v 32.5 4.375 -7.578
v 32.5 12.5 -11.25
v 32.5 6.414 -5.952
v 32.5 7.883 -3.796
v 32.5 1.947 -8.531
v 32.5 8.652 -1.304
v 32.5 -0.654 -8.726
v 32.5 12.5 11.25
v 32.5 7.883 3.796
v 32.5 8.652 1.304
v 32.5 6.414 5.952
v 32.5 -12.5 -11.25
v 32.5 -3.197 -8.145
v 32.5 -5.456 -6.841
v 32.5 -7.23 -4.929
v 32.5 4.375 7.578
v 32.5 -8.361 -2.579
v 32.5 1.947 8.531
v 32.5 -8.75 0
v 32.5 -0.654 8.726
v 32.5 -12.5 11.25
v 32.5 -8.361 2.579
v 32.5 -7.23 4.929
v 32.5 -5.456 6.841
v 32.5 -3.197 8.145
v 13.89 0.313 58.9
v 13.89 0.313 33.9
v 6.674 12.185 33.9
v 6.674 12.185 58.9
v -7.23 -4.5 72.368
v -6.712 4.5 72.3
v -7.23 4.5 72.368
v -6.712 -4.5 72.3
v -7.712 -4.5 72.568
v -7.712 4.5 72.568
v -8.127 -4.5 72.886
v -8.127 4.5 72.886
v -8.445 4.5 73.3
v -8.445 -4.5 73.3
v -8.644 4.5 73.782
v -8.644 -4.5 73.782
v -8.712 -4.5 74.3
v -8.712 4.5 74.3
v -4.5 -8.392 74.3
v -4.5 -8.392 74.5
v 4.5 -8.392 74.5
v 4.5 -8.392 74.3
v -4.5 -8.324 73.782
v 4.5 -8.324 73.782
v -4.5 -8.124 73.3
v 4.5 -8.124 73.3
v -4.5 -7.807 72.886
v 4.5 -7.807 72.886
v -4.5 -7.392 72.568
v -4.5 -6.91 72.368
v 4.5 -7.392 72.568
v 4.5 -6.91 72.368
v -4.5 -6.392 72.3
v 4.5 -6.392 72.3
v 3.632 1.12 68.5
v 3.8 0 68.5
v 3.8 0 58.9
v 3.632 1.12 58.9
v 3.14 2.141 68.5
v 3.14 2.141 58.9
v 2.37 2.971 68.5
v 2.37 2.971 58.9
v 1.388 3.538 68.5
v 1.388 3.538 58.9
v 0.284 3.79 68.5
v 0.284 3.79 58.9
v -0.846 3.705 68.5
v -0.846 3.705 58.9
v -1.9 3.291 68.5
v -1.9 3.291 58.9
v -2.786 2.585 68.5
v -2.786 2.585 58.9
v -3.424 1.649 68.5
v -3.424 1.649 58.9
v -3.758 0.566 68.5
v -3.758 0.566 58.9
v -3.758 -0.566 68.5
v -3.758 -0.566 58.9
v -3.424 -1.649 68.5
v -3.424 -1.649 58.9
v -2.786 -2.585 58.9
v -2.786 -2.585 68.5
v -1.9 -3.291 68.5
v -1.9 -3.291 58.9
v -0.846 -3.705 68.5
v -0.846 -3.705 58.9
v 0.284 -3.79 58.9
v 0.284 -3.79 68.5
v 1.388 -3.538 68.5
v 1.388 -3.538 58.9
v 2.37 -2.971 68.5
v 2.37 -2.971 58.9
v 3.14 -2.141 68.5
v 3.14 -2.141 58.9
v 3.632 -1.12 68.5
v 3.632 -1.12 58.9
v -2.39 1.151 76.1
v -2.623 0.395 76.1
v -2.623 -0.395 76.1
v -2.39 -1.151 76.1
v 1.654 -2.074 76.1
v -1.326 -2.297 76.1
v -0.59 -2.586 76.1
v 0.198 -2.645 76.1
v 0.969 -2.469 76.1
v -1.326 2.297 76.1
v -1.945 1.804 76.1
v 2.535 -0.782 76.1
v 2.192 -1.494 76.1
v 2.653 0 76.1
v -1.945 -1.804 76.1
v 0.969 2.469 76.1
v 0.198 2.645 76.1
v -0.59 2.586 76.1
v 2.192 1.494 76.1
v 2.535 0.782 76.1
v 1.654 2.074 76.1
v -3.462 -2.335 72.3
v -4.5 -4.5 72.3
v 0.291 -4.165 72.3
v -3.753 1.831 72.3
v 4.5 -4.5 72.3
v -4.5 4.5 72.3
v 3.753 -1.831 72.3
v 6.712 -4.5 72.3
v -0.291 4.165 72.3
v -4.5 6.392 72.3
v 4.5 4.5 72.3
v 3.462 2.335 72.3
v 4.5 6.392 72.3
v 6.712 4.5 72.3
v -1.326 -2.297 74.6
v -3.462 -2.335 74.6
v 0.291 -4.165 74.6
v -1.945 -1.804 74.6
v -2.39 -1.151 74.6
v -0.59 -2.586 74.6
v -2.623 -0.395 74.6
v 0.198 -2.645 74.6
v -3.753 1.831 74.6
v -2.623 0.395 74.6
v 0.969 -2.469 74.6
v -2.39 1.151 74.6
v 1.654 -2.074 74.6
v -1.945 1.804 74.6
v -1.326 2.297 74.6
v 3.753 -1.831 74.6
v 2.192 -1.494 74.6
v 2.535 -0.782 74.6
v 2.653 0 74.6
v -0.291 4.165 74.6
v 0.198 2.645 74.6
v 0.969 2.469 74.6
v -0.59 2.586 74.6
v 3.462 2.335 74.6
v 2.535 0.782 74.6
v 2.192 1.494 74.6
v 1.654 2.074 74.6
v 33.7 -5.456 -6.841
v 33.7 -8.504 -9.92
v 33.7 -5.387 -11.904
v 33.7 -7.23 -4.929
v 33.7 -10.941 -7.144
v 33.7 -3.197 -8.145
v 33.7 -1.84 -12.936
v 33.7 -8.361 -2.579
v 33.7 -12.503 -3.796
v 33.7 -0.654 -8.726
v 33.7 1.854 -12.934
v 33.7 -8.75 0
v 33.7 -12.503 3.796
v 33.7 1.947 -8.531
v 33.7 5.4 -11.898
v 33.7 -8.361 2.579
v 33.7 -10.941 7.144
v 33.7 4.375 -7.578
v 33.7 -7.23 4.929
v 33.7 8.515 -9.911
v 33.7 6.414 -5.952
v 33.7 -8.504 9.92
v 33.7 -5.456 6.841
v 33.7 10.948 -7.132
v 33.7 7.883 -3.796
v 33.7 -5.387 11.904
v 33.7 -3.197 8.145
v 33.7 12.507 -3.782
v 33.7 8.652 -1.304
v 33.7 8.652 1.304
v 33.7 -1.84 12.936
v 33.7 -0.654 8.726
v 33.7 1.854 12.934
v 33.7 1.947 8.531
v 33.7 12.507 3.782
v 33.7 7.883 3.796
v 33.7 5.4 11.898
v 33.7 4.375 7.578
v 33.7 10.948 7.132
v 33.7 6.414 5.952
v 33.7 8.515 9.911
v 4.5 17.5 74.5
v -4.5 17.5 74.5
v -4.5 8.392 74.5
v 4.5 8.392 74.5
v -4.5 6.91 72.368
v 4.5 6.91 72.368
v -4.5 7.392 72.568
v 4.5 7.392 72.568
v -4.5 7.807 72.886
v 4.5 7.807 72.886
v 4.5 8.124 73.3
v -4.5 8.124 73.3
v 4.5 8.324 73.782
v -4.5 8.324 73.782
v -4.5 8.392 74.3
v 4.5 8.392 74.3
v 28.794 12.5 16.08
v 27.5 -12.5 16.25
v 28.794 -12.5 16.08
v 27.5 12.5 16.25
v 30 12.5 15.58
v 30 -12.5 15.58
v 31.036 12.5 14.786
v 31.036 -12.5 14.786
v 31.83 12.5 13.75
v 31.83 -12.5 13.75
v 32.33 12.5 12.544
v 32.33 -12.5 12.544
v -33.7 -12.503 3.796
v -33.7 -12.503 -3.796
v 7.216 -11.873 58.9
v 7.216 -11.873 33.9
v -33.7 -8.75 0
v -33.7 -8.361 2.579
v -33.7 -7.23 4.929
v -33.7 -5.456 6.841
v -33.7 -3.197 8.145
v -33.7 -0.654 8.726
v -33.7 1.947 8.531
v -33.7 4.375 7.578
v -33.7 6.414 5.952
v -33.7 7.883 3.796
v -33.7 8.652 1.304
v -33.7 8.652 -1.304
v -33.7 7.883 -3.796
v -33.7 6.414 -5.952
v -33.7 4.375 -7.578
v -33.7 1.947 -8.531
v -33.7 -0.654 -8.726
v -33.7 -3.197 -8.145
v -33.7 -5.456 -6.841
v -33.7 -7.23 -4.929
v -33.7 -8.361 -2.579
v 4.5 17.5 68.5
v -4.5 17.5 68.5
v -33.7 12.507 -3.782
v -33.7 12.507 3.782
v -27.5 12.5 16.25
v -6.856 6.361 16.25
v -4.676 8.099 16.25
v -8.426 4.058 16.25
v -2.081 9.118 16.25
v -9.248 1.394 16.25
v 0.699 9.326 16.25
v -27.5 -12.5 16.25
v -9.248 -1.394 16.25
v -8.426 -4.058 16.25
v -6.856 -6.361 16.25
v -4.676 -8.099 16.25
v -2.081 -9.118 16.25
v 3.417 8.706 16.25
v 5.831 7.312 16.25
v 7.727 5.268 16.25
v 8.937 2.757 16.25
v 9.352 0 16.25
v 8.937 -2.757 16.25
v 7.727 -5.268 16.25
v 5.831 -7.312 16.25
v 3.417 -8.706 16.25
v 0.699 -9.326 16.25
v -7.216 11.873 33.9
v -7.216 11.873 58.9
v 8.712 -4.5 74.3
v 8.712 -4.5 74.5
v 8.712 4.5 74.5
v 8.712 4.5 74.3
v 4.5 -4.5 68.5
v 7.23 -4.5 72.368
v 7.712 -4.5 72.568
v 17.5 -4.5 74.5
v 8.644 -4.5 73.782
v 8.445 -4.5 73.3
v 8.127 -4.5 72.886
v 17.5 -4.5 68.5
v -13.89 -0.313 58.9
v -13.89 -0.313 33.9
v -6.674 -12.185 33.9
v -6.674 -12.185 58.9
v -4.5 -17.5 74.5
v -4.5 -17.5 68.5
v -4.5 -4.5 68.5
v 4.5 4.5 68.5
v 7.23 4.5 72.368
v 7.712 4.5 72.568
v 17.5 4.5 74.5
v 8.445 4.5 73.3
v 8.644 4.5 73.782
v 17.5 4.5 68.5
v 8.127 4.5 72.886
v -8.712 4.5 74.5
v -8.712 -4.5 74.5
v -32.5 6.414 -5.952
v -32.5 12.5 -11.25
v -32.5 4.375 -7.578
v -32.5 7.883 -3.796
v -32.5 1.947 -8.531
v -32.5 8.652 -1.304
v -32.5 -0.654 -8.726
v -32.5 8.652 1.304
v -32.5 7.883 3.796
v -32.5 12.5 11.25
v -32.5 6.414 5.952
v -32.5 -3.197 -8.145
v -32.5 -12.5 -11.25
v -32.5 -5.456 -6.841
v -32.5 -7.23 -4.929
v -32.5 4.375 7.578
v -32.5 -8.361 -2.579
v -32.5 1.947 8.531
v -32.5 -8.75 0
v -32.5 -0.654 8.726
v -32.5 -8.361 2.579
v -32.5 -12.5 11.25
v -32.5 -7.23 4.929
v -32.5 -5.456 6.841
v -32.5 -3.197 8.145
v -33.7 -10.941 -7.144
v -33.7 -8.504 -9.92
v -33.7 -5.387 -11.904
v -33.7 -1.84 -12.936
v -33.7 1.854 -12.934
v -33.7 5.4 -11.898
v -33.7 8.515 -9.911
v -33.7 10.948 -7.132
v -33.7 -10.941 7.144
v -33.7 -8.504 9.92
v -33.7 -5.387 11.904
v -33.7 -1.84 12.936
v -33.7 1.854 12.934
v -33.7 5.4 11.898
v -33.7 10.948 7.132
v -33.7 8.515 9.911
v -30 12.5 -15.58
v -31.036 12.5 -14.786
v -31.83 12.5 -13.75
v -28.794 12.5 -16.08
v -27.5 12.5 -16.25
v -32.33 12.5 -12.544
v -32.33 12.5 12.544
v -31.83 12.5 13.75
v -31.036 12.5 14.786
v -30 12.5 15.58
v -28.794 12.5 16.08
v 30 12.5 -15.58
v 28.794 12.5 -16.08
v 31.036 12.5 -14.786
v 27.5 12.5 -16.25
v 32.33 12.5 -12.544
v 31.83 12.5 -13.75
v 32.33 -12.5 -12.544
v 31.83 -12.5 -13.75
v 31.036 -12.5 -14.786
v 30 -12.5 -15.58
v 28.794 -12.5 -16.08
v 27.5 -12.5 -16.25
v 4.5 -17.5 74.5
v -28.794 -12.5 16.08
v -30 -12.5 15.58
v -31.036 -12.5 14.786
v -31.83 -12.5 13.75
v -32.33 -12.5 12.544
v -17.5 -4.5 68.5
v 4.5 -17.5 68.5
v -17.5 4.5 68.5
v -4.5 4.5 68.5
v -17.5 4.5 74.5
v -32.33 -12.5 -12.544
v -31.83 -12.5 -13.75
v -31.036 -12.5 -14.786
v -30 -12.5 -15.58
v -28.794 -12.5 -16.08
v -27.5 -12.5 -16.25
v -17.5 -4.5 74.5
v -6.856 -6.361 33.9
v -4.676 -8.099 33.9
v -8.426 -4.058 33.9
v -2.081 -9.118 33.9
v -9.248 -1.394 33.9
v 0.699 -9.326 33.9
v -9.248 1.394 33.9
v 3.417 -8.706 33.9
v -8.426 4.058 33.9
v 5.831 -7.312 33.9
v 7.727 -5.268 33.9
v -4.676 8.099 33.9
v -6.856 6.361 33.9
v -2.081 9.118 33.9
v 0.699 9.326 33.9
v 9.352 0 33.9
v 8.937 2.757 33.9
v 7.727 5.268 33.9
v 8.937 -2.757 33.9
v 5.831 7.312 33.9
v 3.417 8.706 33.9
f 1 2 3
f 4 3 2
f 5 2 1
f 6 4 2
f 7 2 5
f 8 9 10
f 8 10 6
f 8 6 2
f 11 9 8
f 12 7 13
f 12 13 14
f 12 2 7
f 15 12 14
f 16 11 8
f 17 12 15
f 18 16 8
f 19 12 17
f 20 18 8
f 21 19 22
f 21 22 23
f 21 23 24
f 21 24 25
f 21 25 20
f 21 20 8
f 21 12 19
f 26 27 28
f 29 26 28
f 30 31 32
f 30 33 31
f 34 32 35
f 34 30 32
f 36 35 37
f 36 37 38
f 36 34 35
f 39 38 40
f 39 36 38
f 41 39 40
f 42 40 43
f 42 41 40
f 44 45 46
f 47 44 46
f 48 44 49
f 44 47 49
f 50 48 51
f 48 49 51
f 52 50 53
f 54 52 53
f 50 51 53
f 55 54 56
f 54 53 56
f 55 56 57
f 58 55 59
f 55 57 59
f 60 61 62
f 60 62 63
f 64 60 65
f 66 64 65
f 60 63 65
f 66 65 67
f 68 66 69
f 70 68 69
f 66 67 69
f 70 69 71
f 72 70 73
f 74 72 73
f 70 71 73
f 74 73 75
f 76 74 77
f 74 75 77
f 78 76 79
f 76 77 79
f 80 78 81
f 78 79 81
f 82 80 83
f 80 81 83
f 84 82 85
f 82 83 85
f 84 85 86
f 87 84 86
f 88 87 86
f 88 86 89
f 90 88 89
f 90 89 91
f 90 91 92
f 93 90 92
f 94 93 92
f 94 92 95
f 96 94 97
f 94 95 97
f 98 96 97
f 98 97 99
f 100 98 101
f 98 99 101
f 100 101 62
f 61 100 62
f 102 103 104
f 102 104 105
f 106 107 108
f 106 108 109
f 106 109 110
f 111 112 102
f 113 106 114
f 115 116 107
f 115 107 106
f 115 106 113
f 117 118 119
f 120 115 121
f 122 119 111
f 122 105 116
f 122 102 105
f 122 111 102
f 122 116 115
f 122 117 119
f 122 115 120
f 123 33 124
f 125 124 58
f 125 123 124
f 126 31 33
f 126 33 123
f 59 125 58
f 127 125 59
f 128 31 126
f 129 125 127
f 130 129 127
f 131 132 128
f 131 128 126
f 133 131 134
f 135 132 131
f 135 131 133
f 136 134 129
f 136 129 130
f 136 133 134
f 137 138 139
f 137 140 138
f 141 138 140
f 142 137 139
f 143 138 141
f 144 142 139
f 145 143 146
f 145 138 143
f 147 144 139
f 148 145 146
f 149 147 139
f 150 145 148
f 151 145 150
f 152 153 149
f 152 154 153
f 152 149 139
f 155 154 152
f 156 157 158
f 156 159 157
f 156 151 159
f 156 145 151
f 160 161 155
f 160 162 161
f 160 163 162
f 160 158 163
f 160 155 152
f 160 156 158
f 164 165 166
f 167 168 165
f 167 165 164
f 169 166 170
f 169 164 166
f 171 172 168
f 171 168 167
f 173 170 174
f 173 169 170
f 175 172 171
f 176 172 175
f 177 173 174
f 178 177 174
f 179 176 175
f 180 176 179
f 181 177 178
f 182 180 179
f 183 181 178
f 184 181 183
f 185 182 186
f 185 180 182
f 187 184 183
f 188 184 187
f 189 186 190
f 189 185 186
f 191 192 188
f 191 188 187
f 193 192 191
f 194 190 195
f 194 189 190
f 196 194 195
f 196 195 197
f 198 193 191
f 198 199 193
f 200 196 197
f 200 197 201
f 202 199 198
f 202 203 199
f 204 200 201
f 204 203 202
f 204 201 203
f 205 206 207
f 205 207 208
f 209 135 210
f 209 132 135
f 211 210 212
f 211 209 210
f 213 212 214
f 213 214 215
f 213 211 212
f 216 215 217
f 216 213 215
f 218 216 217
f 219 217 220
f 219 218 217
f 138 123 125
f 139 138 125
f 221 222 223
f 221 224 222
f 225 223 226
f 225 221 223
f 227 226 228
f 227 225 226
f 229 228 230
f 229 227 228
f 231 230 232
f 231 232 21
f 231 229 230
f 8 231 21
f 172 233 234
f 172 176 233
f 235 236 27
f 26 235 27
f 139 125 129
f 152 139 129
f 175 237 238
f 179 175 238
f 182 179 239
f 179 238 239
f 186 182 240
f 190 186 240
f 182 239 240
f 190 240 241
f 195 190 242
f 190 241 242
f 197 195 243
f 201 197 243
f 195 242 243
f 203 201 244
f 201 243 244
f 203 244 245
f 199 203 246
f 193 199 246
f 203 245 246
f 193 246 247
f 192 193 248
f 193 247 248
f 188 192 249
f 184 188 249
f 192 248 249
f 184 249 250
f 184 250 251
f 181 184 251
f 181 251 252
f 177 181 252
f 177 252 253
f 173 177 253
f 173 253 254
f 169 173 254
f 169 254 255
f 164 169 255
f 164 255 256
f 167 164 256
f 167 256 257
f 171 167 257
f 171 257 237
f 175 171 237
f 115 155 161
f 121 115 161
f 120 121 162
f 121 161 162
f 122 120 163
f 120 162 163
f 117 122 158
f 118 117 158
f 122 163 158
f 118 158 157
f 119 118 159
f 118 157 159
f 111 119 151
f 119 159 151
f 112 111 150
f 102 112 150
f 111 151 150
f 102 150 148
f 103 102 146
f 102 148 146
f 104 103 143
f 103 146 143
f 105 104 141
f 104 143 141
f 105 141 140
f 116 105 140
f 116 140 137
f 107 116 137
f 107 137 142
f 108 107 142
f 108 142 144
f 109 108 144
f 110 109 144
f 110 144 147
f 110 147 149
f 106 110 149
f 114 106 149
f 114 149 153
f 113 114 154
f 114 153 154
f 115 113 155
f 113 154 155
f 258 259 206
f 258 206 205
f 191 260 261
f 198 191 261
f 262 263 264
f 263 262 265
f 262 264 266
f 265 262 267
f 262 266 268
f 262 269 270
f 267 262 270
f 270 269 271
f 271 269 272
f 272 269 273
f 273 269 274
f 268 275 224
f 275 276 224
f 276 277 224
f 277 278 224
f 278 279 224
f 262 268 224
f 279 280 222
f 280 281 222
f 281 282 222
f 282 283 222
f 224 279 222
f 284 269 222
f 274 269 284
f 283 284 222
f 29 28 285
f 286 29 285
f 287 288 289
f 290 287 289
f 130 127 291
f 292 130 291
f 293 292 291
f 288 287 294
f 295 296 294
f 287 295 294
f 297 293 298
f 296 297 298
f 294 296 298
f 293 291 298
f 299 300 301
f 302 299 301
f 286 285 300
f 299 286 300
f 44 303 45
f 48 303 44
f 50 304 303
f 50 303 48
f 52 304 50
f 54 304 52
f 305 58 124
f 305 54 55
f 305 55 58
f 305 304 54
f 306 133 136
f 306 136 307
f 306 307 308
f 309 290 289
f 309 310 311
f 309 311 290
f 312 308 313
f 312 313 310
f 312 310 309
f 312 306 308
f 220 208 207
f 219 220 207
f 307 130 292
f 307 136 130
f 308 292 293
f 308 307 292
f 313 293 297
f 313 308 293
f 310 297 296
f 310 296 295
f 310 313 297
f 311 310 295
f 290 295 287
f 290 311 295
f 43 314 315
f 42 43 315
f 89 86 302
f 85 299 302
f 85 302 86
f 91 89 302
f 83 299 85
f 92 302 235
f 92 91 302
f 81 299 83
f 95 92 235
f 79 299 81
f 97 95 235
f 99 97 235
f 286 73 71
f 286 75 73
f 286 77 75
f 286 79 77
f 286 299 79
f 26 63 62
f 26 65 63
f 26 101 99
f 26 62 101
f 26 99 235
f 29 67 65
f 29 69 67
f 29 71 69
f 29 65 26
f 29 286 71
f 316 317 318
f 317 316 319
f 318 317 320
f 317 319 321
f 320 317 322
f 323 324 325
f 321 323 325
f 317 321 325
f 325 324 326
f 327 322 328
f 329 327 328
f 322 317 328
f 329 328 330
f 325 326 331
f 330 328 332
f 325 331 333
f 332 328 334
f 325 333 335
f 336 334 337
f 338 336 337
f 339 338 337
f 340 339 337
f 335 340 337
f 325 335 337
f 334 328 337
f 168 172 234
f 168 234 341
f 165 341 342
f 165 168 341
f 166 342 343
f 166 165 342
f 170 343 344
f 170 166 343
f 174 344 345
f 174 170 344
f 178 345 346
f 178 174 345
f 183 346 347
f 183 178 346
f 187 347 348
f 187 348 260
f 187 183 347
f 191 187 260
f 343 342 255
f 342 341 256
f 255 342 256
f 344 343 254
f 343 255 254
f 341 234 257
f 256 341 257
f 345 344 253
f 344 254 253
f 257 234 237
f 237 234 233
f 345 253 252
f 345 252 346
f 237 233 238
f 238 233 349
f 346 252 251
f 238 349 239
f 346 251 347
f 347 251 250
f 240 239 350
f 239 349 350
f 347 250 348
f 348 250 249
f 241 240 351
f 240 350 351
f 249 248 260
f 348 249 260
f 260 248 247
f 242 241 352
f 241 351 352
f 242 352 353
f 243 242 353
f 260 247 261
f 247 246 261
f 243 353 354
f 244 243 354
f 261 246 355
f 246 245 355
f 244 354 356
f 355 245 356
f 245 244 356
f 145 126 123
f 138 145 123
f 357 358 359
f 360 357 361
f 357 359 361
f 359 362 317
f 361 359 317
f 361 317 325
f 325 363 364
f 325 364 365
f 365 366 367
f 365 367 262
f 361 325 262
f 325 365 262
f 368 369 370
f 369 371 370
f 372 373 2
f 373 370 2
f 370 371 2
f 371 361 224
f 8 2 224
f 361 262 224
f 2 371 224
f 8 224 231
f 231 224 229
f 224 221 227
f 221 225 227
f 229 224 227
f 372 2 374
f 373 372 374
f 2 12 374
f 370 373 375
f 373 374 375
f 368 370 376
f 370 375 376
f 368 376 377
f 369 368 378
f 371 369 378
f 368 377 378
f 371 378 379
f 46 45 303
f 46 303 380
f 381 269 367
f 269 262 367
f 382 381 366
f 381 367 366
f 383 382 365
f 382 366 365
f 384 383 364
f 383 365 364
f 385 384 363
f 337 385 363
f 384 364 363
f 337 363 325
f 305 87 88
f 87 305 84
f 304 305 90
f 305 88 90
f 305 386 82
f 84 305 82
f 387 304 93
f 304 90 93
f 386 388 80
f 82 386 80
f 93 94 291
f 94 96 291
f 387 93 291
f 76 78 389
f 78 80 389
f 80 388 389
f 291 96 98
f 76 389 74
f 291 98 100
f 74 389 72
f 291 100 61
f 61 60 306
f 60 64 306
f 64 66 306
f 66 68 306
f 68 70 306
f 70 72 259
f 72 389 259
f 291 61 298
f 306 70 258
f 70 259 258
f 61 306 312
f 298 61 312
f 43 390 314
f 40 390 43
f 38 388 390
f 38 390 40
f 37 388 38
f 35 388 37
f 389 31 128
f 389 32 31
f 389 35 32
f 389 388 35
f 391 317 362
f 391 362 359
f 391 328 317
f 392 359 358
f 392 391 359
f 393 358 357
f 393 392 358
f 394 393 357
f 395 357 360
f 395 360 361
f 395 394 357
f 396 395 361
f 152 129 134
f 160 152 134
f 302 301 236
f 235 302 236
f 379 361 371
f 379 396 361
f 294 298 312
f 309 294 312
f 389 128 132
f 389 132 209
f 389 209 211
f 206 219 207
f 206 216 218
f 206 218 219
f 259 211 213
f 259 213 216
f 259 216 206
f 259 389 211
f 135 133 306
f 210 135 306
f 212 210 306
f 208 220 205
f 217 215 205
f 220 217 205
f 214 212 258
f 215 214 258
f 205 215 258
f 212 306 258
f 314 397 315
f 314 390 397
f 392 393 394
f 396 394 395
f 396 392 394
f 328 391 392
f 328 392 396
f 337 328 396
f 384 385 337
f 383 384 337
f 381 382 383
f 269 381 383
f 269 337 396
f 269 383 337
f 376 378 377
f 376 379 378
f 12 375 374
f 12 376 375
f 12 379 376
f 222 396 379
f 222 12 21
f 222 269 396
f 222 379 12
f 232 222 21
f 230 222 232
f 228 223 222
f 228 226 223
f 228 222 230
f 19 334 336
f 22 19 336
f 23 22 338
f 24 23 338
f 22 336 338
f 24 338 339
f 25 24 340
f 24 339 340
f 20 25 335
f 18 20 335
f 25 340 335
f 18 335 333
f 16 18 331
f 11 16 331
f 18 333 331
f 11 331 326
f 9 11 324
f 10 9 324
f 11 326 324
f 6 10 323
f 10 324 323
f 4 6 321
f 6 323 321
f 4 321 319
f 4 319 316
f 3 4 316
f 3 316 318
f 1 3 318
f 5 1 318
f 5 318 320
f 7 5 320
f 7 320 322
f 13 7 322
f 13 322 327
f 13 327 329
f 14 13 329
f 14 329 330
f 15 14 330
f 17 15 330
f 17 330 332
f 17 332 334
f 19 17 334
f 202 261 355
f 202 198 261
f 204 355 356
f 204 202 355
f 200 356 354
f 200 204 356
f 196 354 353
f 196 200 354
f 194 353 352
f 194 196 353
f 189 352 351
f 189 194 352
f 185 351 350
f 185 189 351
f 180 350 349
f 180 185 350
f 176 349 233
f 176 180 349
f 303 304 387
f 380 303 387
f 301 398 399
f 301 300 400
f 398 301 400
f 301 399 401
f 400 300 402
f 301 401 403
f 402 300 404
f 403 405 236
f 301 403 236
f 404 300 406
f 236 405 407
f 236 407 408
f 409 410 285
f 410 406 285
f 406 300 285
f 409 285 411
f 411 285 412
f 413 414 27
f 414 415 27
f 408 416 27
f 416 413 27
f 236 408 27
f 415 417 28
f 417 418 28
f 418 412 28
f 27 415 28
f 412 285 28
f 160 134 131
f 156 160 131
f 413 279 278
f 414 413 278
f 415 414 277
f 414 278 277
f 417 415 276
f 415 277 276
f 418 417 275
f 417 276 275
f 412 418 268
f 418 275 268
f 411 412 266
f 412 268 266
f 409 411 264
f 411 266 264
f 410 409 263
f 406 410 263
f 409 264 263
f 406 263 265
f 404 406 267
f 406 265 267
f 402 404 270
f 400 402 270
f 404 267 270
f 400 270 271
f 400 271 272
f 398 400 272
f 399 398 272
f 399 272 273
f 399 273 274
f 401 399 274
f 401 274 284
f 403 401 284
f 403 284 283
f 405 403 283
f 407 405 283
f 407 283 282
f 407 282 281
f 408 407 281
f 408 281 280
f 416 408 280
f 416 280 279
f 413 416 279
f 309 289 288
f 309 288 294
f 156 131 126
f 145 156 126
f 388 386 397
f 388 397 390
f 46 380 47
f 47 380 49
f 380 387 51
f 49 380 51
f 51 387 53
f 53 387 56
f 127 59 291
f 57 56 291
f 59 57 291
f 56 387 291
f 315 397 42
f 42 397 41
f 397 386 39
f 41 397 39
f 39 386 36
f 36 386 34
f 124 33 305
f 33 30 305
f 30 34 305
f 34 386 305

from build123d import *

# Parameters (mm, degrees)
F0_W      = 65
F0_H      = 32.5
F1_DEPTH  = 12.5
F2_R      = 9.3523138159
F3_DEPTH  = 33.9
F4_R      = 5
F6_DEPTH  = 25
F7_R      = 3.8004519978
F8_DEPTH  = 9.6
F10_W     = 35
F10_H     = 9
F10_R     = 3.8004519978
F11_DEPTH = 6
F9_W      = 9
F9_H      = 35
F9_R      = 3.8004519978
F12_DEPTH = 6
F13_R     = 3.8004519978
F14_DEPTH = 15.4
F16_DEPTH = 2.2
F17_R     = 2
F19_DEPTH = 2.3
F20_R     = 2.6528725425
F21_DEPTH = 1.5
F23_DEPTH = 33.7
F25_D     = 17.5
F25_2_D   = 17.5


with BuildPart() as f1:
    # F0 (on Front) → F1 (new body, symmetric)
    with BuildSketch(Plane.XZ):
        Rectangle(F0_W, F0_H)
    extrude(amount=F1_DEPTH, both=True)

    # F2 (on Top) → F3 (join)
    with BuildSketch(Plane.XY):
        Circle(F2_R)
    extrude(amount=F3_DEPTH)

    # F4
    f4_edges = [f1.edges().sort_by_distance(p)[0] for p in [
        (-32.5, 0, 16.25),
        (-32.5, 0, -16.25),
        (32.5, 0, 16.25),
        (32.5, 0, -16.25),
    ]]
    fillet(f4_edges, radius=F4_R)

    # F5 (on face) → F6 (join)
    with BuildSketch(Plane.XY.offset(33.9)):
        Polygon((-7.2158822013, 11.872535), (-13.8898580181, -0.312869797), (-6.6739758167, -12.1854047971), (7.2158822013, -11.872535), (13.8898580181, 0.312869797), (6.6739758167, 12.1854047971), align=None)
    extrude(amount=F6_DEPTH)

    # F7 (on face) → F8 (join)
    with BuildSketch(Plane.XY.offset(58.9)):
        Circle(F7_R)
    extrude(amount=F8_DEPTH)



with BuildPart() as f11:
    # F10 (on face) → F11 (new body)
    with BuildSketch(Plane.XY.offset(68.5)):
        Rectangle(F10_W, F10_H)
        Circle(F10_R, mode=Mode.SUBTRACT)
    extrude(amount=F11_DEPTH)


with BuildPart() as f1_1:
    add(f1.part)

    add(f11.part)  # F12 merges F11
    # F9 (on face) → F12 (join)
    with BuildSketch(Plane.XY.offset(68.5)):
        Rectangle(F9_W, F9_H)
        Circle(F9_R, mode=Mode.SUBTRACT)
    extrude(amount=F12_DEPTH)

    # F13 (on face) → F14 (join)
    with BuildSketch(Plane.XY.offset(74.5)):
        Circle(F13_R)
    extrude(amount=-F14_DEPTH)

    # F15 (on face) → F16 (cut)
    with BuildSketch(Plane.XY.offset(74.5)):
        Polygon((-4.5, -8.3923498169), (4.5, -8.3923498169), (4.5, -4.5), (8.7124751881, -4.5), (8.7124751881, 4.5), (4.5, 4.5), (4.5, 8.3923498169), (-4.5, 8.3923498169), (-4.5, 4.5), (-8.7124751881, 4.5), (-8.7124751881, -4.5), (-4.5, -4.5), align=None)
    extrude(amount=-F16_DEPTH, mode=Mode.SUBTRACT)

    # F17
    f17_edges = [f1_1.edges().sort_by_distance(p)[0] for p in [
        (8.712475, 0, 72.3),
        (0, 8.39235, 72.3),
        (-8.712475, 0, 72.3),
        (0, -8.39235, 72.3),
    ]]
    fillet(f17_edges, radius=F17_R)

    # F18 (on face) → F19 (join)
    with BuildSketch(Plane.XY.offset(72.3)):
        Polygon((-3.4616619036, -2.3346488586), (0.2910342686, -4.1652115771), (3.7526961723, -1.8305627186), (3.4616619036, 2.3346488586), (-0.2910342686, 4.1652115771), (-3.7526961723, 1.8305627186), align=None)
    extrude(amount=F19_DEPTH)

    # F20 (on face) → F21 (join)
    with BuildSketch(Plane.XY.offset(74.6)):
        Circle(F20_R)
    extrude(amount=F21_DEPTH)

    # F25 (through all)
    with Locations(Plane.YZ.offset(33.7)):
        with Locations((0, 0)):
            Hole(F25_D / 2)


with BuildPart() as f23:
    # F22 (on Right) → F23 (new body, symmetric)
    with BuildSketch(Plane.YZ):
        with BuildLine():
            Line((-12.5028542199, 3.7958711109), (-12.5028542199, -3.7958711109))
            ThreePointArc((-12.5028542199, -3.7958711109), (0.0071350706, -13.0663671395), (12.5069923382, -3.782214138))
            Line((12.5069923382, -3.782214138), (12.5069923382, 3.782214138))
            ThreePointArc((12.5069923382, 3.782214138), (0.0071350706, 13.0663671395), (-12.5028542199, 3.7958711109))
        make_face()
    extrude(amount=F23_DEPTH, both=True)

    # F25#2 (through all)
    with Locations(Plane.YZ.offset(33.7)):
        with Locations((0, 0)):
            Hole(F25_2_D / 2)


solid = Compound([f1_1.part, f23.part])
